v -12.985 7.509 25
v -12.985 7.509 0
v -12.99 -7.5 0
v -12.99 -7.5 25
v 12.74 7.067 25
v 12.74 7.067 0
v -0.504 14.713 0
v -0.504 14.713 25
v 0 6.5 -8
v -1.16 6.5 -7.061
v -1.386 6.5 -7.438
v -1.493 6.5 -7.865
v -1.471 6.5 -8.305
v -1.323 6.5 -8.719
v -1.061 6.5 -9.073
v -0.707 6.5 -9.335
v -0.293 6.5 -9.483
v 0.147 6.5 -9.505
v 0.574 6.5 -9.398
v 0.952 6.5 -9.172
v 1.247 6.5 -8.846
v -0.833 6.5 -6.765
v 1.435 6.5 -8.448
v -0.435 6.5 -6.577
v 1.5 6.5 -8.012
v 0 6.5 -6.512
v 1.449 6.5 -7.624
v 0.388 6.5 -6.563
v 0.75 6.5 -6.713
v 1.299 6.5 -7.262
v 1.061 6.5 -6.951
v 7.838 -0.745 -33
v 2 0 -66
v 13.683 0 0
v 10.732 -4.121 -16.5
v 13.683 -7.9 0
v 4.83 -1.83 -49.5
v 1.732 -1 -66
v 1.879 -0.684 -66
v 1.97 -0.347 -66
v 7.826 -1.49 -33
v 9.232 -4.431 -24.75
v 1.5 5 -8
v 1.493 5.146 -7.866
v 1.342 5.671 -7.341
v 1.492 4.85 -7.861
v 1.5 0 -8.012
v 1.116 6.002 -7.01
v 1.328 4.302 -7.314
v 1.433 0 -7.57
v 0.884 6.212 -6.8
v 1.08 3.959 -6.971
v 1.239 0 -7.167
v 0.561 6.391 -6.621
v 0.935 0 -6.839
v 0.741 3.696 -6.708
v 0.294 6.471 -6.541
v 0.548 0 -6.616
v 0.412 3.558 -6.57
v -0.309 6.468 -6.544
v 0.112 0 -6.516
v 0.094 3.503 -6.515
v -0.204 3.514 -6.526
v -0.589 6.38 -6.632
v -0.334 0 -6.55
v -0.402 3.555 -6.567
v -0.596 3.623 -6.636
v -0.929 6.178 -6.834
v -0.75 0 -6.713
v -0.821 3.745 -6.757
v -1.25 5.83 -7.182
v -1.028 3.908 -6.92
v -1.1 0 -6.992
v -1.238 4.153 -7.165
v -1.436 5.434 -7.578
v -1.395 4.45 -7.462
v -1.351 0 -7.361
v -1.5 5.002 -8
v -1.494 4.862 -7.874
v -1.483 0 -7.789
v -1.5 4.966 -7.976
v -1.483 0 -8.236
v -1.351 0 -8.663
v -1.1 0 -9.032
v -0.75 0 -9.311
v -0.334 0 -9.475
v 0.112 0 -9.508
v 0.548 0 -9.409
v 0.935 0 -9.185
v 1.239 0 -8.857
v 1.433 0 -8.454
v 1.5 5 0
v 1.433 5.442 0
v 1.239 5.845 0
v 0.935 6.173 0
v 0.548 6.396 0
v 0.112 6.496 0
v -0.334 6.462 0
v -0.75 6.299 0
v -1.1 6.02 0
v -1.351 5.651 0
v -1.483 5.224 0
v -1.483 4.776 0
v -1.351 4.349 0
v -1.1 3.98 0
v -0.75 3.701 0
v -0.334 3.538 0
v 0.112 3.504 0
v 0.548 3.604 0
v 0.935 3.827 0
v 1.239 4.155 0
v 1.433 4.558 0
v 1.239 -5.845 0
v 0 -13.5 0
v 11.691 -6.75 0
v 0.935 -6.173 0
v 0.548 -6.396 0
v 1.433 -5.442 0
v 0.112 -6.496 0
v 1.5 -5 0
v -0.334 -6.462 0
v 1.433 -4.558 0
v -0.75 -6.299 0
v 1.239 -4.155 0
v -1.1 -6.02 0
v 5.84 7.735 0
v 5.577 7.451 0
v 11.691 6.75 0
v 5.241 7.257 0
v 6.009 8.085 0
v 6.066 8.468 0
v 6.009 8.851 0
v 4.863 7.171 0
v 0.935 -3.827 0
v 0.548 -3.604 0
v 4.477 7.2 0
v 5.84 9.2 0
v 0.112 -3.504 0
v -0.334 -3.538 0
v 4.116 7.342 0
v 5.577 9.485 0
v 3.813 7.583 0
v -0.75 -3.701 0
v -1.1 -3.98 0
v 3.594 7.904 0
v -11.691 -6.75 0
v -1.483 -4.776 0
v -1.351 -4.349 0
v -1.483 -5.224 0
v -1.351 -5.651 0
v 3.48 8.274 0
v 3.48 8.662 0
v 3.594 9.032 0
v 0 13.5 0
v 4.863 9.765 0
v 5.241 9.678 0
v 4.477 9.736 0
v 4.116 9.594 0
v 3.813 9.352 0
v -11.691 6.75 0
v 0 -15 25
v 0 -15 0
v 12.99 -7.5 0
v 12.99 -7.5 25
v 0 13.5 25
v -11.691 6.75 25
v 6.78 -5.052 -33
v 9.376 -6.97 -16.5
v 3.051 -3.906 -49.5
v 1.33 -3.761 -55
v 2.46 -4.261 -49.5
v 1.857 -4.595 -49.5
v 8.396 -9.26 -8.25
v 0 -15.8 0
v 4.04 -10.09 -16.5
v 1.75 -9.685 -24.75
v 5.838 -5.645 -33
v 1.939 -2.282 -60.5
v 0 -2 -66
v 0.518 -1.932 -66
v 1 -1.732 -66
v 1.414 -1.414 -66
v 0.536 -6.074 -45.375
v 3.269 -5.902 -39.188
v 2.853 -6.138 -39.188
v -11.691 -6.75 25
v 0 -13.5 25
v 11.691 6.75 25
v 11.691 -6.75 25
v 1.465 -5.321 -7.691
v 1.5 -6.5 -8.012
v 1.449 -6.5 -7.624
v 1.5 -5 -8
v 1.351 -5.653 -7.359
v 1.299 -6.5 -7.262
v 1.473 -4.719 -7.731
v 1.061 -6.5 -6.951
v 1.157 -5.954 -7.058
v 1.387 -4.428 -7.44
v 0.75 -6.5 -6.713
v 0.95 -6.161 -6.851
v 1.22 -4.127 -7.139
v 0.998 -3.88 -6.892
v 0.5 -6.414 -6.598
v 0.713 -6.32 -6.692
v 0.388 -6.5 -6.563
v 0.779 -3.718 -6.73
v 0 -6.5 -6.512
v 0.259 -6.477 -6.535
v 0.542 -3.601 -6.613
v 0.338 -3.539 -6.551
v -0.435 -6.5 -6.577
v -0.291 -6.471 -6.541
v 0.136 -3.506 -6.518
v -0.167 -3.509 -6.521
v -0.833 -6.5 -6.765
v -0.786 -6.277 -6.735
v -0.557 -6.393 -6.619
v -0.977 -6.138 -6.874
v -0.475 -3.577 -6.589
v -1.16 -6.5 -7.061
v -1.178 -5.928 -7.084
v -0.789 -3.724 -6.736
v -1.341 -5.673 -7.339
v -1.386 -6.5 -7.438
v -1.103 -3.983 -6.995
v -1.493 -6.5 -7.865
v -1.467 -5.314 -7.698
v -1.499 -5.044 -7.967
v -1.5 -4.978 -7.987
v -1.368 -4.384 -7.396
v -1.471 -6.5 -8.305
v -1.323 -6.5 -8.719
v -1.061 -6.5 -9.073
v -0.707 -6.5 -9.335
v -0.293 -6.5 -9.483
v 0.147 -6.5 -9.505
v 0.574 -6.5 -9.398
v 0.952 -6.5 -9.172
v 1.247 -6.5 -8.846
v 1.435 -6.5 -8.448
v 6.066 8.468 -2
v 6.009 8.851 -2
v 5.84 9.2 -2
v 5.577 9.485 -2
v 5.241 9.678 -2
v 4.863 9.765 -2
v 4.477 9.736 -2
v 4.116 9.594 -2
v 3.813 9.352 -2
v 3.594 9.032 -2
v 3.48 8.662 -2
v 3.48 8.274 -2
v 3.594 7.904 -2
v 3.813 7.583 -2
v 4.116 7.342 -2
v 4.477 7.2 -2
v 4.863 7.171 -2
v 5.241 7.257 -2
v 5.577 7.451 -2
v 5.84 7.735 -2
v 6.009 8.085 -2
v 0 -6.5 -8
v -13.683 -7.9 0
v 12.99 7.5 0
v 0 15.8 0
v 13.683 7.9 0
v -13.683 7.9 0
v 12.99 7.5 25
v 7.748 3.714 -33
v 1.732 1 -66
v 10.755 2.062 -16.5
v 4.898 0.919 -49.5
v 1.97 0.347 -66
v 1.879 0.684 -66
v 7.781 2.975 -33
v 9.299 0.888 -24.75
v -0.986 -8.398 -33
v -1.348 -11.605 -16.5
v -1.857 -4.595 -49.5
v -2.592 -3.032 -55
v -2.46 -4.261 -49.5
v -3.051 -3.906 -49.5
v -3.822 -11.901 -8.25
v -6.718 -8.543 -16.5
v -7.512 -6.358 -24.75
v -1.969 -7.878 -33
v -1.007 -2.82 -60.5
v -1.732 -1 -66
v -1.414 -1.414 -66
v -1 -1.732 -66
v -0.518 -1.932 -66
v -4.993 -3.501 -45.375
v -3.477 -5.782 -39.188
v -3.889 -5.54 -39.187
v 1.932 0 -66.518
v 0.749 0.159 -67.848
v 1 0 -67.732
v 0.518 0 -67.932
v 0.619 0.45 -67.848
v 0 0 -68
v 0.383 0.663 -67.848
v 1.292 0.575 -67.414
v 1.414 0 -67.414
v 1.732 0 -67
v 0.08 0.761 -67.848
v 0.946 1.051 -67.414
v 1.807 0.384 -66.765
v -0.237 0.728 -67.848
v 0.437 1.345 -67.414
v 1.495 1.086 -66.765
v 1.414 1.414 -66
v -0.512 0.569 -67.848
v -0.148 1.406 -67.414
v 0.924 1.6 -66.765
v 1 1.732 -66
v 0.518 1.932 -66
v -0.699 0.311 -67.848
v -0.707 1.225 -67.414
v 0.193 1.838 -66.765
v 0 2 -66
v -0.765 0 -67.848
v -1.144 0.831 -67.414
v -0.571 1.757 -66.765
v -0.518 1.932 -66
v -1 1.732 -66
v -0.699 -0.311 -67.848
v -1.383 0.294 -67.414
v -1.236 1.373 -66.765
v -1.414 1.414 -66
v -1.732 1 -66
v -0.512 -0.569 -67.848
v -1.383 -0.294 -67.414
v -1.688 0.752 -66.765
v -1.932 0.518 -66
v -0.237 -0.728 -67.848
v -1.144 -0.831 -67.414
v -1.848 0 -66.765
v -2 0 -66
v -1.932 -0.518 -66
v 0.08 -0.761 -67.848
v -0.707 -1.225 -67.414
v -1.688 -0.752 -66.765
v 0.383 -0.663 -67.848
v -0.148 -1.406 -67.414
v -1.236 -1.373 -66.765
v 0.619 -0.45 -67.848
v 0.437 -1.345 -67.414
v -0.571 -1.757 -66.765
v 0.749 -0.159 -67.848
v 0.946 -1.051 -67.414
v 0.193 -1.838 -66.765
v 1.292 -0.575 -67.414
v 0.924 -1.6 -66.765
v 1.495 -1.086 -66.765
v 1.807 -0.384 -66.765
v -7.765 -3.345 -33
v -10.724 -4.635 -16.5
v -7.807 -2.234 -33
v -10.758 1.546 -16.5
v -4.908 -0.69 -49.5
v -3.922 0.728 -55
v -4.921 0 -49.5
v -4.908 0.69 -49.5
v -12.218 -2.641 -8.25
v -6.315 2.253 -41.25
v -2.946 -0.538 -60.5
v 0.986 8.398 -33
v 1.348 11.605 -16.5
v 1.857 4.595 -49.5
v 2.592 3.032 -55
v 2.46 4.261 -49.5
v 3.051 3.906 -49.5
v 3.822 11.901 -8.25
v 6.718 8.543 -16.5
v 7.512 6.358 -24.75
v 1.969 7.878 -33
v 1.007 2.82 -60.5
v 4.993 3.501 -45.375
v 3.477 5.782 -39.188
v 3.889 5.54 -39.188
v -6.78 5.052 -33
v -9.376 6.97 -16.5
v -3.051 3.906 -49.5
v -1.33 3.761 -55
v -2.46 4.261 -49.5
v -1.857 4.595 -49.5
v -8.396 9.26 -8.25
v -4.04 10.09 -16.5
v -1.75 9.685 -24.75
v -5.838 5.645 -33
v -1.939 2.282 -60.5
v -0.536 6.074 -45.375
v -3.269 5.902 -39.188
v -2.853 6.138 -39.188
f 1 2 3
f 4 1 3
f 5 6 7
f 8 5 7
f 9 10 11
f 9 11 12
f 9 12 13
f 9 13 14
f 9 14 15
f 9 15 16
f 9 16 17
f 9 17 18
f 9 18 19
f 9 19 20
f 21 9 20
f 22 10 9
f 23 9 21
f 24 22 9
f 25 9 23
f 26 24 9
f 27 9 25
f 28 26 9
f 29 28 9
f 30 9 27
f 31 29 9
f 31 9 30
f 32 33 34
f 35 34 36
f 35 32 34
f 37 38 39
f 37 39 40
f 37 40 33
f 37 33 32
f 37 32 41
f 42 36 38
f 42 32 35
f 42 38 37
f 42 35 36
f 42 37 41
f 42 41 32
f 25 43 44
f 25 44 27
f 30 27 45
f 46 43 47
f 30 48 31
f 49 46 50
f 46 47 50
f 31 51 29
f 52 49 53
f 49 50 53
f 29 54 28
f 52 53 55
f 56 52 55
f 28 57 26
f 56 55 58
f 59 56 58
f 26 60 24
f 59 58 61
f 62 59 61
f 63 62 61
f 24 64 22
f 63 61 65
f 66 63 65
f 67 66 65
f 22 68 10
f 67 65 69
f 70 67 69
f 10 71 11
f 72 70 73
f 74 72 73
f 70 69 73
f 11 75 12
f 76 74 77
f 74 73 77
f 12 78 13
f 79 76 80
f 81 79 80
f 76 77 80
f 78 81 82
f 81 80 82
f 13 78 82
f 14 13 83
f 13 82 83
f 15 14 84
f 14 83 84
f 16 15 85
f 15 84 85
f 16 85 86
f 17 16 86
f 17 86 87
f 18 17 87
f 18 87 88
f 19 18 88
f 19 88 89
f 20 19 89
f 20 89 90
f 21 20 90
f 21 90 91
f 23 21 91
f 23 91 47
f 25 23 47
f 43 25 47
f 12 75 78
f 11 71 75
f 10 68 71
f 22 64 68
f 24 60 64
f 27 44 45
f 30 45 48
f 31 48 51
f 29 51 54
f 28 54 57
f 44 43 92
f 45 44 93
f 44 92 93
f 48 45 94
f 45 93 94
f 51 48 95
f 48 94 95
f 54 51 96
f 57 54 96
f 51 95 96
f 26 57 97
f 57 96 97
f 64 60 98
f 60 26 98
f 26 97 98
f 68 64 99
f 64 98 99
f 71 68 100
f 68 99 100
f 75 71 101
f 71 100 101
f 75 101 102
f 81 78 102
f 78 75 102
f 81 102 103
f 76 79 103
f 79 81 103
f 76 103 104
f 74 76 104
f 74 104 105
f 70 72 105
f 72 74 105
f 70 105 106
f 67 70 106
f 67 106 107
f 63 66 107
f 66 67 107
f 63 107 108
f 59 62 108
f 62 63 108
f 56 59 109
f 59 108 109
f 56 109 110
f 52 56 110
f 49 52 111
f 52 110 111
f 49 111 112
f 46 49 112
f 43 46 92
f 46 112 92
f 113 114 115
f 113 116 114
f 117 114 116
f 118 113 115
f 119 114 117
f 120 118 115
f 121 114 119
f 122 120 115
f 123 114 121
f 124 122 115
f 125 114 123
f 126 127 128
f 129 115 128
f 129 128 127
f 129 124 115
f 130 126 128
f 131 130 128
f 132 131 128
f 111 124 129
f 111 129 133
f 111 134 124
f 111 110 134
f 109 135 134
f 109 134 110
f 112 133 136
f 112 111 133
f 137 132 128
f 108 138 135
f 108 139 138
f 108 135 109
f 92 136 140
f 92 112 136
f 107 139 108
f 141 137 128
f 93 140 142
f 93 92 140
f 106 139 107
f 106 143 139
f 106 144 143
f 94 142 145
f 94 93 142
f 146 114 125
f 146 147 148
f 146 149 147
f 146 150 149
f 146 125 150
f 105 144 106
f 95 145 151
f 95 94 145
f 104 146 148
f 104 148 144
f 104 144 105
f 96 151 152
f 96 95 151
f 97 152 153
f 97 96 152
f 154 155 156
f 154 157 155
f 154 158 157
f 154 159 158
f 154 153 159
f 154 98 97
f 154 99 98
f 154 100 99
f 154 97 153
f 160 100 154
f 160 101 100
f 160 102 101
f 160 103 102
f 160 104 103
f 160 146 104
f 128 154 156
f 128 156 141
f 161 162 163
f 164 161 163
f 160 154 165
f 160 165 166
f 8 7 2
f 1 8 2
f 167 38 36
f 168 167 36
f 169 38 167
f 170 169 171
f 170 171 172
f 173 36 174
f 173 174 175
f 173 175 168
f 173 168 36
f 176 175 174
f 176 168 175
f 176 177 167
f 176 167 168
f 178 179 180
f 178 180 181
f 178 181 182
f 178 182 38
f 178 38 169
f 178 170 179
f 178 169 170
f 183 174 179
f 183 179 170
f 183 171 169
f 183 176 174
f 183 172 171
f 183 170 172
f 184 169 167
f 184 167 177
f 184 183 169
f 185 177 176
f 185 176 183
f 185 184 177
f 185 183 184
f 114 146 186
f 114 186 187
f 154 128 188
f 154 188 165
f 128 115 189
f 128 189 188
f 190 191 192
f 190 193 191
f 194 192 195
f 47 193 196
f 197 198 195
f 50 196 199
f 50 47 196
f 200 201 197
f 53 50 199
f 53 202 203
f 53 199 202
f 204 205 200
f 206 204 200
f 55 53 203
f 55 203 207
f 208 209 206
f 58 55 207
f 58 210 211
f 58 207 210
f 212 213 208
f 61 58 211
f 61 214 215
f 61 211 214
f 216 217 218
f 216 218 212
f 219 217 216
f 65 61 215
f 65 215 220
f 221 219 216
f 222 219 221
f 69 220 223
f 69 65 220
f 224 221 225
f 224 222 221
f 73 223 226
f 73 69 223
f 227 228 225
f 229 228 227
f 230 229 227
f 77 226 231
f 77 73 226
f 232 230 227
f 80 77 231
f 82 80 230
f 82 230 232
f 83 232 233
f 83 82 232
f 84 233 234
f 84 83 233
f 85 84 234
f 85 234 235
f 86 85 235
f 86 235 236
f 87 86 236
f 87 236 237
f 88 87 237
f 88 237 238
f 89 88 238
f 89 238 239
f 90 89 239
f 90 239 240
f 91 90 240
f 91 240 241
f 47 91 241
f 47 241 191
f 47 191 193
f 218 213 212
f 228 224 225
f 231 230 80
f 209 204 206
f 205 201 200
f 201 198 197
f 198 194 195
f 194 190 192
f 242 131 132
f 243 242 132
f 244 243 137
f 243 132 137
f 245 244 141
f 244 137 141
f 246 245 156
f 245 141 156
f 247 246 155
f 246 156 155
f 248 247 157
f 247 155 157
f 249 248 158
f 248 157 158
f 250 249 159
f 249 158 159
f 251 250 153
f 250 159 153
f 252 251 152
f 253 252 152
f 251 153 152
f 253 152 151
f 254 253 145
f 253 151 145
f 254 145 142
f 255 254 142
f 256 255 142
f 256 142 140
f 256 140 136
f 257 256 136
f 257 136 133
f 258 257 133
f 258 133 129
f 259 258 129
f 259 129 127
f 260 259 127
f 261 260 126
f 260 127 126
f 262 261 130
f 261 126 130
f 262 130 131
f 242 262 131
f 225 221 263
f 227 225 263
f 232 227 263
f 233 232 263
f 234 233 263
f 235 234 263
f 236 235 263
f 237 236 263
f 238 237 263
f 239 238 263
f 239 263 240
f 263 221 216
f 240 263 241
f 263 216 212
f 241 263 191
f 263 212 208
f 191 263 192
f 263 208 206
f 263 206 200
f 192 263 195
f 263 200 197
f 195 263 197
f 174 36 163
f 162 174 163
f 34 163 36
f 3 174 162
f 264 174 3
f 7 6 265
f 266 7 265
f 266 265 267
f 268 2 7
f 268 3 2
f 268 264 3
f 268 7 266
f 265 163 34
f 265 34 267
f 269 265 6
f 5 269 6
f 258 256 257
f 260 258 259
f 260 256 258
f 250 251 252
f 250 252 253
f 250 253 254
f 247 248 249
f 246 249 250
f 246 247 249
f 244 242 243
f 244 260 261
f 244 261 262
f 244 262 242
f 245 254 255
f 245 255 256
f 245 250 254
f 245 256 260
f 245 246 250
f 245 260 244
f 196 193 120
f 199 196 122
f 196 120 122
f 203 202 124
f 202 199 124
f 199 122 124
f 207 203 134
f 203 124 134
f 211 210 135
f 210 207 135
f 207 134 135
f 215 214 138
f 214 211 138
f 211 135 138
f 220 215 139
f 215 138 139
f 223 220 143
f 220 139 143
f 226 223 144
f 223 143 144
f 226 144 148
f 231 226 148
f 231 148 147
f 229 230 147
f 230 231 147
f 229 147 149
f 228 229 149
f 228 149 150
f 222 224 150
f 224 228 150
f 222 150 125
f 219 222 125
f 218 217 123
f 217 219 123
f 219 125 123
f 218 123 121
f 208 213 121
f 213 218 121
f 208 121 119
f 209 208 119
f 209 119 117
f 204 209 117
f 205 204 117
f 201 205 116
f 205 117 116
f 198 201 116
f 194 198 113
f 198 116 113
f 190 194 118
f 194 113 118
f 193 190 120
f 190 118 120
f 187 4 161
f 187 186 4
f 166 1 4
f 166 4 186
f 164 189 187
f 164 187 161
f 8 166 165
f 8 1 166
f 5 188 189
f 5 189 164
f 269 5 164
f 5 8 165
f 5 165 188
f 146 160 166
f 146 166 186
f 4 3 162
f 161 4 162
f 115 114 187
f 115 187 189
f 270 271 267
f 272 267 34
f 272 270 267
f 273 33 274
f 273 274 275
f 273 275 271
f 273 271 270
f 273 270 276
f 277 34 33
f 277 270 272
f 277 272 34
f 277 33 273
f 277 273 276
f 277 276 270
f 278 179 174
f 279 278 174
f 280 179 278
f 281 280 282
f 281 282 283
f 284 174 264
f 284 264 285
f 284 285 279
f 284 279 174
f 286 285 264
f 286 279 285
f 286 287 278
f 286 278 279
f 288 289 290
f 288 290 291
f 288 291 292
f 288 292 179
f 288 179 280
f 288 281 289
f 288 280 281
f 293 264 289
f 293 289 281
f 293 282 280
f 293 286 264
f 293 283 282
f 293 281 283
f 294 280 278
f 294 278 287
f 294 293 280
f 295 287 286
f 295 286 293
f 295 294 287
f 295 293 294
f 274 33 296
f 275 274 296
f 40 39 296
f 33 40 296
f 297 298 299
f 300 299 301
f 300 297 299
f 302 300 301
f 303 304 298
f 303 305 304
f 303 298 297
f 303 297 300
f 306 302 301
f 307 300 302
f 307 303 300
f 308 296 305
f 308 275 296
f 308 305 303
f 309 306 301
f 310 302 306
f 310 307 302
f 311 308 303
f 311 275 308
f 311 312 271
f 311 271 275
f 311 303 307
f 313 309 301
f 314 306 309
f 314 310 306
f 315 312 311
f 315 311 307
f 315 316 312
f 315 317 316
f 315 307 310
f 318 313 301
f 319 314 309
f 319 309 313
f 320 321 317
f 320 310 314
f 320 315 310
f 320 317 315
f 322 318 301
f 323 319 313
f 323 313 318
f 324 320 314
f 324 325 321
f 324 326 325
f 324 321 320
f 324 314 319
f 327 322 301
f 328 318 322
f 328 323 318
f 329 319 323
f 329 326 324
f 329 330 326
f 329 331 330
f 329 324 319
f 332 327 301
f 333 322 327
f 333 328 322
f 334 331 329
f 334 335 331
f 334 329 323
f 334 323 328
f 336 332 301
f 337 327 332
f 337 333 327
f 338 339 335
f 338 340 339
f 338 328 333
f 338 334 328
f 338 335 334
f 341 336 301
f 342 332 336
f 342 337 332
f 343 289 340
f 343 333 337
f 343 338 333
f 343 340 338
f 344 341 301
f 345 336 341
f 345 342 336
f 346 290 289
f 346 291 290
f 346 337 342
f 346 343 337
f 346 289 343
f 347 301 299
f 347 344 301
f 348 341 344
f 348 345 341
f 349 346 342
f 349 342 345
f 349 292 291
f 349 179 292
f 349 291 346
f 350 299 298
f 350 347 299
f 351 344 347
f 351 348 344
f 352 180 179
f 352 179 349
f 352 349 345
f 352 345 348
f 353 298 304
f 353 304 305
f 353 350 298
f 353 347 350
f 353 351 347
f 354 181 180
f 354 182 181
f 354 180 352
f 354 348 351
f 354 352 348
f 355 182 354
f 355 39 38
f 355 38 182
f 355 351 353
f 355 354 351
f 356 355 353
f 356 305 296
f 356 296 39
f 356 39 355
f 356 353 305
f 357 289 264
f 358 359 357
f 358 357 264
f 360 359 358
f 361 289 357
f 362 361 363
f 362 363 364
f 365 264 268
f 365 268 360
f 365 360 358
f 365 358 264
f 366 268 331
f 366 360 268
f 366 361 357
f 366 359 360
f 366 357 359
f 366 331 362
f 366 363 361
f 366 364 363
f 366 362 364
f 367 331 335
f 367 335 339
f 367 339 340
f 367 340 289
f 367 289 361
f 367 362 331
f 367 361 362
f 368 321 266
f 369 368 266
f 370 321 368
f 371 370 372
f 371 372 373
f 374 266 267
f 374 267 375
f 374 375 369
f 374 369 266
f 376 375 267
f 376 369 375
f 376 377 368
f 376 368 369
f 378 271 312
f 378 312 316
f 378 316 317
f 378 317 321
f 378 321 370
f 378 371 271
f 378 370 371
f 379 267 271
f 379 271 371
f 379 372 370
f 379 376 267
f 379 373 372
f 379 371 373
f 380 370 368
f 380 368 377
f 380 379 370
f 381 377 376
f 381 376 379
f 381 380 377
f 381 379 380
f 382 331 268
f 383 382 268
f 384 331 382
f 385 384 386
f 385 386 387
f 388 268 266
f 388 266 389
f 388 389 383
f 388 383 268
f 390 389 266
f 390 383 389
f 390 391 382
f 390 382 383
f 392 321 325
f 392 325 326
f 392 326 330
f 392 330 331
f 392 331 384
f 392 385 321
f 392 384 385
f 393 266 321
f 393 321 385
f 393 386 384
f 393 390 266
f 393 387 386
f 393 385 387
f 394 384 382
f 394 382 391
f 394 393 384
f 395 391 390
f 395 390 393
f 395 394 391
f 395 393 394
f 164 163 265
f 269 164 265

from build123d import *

# Parameters (mm, degrees)
PAD_DEPTH            = 25
SKETCH002_R          = 2
SKETCH003_R          = 1.300458
POCKET_DEPTH         = 2
SKETCH004_R          = 1.5
POCKET001_DEPTH      = 8
SKETCH005_R          = 1.5000493445
POCKET002_DEPTH      = 6.5
POCKET002_DEPTH_BACK = 6.5


with BuildPart() as part:
    # Sketch → Pad (new body)
    with BuildSketch(Plane.XY):
        Polygon((-0.5039697873, 14.7133968199), (-12.9849027673, 7.508821487), (-12.99, -7.5), (0, -14.9996699964), (12.99, -7.5), (12.99, 7.5), (12.74, 7.0669872981), align=None)
        Polygon((0, 13.4996699964), (-11.6910571596, 6.7498349982), (-11.6910571596, -6.7498349982), (0, -13.4996699964), (11.6910571596, -6.7498349982), (11.6910571596, 6.7498349982), align=None, mode=Mode.SUBTRACT)
    extrude(amount=PAD_DEPTH)

    # Sketch001 (on Face14 of Pad) → AdditiveLoft section 0
    with BuildSketch(Plane(origin=(0, 0, 0), x_dir=(1, 0, 0), z_dir=(0, 0, -1))):
        Polygon((0, 15.7996699964), (-13.6829155883, 7.8998349982), (-13.6829155883, -7.8998349982), (0, -15.7996699964), (13.6829155883, -7.8998349982), (13.6829155883, 7.8998349982), align=None)
    # Sketch002 → AdditiveLoft section 1
    with BuildSketch(Plane.XY.offset(-66)):
        Circle(SKETCH002_R)
    loft()

    # Sketch003 (on Face24 of AdditiveLoft) → Pocket (cut)
    with BuildSketch(Plane.XY):
        with Locations((4.766006, 8.46789)):
            Circle(SKETCH003_R)
    extrude(amount=-POCKET_DEPTH, mode=Mode.SUBTRACT)

    # Sketch004 (on Face24 of Pocket) → Pocket001 (cut)
    with BuildSketch(Plane.XY):
        with Locations((0, 5)):
            Circle(SKETCH004_R)
        with Locations((0, -5)):
            Circle(SKETCH004_R)
    extrude(amount=-POCKET001_DEPTH, mode=Mode.SUBTRACT)

    # Sketch005 → Pocket002 (cut, two sides)
    with BuildSketch(Plane.XZ) as pocket002_sk:
        with Locations((0, -8.012167)):
            Circle(SKETCH005_R)
    extrude(amount=-POCKET002_DEPTH, mode=Mode.SUBTRACT)
    extrude(pocket002_sk.sketch, amount=POCKET002_DEPTH_BACK, mode=Mode.SUBTRACT)

    # Sketch006 → Revolution (revolve)
    with BuildSketch(Plane.XZ):
        with BuildLine():
            Line((0, -66), (2, -66))
            ThreePointArc((0, -68), (1.4142135624, -67.4142135624), (2, -66))
            Line((0, -66), (0, -68))
        make_face()
    revolve(axis=Axis((0, 0, 0), (0, 0, 1)))


solid = part.part
